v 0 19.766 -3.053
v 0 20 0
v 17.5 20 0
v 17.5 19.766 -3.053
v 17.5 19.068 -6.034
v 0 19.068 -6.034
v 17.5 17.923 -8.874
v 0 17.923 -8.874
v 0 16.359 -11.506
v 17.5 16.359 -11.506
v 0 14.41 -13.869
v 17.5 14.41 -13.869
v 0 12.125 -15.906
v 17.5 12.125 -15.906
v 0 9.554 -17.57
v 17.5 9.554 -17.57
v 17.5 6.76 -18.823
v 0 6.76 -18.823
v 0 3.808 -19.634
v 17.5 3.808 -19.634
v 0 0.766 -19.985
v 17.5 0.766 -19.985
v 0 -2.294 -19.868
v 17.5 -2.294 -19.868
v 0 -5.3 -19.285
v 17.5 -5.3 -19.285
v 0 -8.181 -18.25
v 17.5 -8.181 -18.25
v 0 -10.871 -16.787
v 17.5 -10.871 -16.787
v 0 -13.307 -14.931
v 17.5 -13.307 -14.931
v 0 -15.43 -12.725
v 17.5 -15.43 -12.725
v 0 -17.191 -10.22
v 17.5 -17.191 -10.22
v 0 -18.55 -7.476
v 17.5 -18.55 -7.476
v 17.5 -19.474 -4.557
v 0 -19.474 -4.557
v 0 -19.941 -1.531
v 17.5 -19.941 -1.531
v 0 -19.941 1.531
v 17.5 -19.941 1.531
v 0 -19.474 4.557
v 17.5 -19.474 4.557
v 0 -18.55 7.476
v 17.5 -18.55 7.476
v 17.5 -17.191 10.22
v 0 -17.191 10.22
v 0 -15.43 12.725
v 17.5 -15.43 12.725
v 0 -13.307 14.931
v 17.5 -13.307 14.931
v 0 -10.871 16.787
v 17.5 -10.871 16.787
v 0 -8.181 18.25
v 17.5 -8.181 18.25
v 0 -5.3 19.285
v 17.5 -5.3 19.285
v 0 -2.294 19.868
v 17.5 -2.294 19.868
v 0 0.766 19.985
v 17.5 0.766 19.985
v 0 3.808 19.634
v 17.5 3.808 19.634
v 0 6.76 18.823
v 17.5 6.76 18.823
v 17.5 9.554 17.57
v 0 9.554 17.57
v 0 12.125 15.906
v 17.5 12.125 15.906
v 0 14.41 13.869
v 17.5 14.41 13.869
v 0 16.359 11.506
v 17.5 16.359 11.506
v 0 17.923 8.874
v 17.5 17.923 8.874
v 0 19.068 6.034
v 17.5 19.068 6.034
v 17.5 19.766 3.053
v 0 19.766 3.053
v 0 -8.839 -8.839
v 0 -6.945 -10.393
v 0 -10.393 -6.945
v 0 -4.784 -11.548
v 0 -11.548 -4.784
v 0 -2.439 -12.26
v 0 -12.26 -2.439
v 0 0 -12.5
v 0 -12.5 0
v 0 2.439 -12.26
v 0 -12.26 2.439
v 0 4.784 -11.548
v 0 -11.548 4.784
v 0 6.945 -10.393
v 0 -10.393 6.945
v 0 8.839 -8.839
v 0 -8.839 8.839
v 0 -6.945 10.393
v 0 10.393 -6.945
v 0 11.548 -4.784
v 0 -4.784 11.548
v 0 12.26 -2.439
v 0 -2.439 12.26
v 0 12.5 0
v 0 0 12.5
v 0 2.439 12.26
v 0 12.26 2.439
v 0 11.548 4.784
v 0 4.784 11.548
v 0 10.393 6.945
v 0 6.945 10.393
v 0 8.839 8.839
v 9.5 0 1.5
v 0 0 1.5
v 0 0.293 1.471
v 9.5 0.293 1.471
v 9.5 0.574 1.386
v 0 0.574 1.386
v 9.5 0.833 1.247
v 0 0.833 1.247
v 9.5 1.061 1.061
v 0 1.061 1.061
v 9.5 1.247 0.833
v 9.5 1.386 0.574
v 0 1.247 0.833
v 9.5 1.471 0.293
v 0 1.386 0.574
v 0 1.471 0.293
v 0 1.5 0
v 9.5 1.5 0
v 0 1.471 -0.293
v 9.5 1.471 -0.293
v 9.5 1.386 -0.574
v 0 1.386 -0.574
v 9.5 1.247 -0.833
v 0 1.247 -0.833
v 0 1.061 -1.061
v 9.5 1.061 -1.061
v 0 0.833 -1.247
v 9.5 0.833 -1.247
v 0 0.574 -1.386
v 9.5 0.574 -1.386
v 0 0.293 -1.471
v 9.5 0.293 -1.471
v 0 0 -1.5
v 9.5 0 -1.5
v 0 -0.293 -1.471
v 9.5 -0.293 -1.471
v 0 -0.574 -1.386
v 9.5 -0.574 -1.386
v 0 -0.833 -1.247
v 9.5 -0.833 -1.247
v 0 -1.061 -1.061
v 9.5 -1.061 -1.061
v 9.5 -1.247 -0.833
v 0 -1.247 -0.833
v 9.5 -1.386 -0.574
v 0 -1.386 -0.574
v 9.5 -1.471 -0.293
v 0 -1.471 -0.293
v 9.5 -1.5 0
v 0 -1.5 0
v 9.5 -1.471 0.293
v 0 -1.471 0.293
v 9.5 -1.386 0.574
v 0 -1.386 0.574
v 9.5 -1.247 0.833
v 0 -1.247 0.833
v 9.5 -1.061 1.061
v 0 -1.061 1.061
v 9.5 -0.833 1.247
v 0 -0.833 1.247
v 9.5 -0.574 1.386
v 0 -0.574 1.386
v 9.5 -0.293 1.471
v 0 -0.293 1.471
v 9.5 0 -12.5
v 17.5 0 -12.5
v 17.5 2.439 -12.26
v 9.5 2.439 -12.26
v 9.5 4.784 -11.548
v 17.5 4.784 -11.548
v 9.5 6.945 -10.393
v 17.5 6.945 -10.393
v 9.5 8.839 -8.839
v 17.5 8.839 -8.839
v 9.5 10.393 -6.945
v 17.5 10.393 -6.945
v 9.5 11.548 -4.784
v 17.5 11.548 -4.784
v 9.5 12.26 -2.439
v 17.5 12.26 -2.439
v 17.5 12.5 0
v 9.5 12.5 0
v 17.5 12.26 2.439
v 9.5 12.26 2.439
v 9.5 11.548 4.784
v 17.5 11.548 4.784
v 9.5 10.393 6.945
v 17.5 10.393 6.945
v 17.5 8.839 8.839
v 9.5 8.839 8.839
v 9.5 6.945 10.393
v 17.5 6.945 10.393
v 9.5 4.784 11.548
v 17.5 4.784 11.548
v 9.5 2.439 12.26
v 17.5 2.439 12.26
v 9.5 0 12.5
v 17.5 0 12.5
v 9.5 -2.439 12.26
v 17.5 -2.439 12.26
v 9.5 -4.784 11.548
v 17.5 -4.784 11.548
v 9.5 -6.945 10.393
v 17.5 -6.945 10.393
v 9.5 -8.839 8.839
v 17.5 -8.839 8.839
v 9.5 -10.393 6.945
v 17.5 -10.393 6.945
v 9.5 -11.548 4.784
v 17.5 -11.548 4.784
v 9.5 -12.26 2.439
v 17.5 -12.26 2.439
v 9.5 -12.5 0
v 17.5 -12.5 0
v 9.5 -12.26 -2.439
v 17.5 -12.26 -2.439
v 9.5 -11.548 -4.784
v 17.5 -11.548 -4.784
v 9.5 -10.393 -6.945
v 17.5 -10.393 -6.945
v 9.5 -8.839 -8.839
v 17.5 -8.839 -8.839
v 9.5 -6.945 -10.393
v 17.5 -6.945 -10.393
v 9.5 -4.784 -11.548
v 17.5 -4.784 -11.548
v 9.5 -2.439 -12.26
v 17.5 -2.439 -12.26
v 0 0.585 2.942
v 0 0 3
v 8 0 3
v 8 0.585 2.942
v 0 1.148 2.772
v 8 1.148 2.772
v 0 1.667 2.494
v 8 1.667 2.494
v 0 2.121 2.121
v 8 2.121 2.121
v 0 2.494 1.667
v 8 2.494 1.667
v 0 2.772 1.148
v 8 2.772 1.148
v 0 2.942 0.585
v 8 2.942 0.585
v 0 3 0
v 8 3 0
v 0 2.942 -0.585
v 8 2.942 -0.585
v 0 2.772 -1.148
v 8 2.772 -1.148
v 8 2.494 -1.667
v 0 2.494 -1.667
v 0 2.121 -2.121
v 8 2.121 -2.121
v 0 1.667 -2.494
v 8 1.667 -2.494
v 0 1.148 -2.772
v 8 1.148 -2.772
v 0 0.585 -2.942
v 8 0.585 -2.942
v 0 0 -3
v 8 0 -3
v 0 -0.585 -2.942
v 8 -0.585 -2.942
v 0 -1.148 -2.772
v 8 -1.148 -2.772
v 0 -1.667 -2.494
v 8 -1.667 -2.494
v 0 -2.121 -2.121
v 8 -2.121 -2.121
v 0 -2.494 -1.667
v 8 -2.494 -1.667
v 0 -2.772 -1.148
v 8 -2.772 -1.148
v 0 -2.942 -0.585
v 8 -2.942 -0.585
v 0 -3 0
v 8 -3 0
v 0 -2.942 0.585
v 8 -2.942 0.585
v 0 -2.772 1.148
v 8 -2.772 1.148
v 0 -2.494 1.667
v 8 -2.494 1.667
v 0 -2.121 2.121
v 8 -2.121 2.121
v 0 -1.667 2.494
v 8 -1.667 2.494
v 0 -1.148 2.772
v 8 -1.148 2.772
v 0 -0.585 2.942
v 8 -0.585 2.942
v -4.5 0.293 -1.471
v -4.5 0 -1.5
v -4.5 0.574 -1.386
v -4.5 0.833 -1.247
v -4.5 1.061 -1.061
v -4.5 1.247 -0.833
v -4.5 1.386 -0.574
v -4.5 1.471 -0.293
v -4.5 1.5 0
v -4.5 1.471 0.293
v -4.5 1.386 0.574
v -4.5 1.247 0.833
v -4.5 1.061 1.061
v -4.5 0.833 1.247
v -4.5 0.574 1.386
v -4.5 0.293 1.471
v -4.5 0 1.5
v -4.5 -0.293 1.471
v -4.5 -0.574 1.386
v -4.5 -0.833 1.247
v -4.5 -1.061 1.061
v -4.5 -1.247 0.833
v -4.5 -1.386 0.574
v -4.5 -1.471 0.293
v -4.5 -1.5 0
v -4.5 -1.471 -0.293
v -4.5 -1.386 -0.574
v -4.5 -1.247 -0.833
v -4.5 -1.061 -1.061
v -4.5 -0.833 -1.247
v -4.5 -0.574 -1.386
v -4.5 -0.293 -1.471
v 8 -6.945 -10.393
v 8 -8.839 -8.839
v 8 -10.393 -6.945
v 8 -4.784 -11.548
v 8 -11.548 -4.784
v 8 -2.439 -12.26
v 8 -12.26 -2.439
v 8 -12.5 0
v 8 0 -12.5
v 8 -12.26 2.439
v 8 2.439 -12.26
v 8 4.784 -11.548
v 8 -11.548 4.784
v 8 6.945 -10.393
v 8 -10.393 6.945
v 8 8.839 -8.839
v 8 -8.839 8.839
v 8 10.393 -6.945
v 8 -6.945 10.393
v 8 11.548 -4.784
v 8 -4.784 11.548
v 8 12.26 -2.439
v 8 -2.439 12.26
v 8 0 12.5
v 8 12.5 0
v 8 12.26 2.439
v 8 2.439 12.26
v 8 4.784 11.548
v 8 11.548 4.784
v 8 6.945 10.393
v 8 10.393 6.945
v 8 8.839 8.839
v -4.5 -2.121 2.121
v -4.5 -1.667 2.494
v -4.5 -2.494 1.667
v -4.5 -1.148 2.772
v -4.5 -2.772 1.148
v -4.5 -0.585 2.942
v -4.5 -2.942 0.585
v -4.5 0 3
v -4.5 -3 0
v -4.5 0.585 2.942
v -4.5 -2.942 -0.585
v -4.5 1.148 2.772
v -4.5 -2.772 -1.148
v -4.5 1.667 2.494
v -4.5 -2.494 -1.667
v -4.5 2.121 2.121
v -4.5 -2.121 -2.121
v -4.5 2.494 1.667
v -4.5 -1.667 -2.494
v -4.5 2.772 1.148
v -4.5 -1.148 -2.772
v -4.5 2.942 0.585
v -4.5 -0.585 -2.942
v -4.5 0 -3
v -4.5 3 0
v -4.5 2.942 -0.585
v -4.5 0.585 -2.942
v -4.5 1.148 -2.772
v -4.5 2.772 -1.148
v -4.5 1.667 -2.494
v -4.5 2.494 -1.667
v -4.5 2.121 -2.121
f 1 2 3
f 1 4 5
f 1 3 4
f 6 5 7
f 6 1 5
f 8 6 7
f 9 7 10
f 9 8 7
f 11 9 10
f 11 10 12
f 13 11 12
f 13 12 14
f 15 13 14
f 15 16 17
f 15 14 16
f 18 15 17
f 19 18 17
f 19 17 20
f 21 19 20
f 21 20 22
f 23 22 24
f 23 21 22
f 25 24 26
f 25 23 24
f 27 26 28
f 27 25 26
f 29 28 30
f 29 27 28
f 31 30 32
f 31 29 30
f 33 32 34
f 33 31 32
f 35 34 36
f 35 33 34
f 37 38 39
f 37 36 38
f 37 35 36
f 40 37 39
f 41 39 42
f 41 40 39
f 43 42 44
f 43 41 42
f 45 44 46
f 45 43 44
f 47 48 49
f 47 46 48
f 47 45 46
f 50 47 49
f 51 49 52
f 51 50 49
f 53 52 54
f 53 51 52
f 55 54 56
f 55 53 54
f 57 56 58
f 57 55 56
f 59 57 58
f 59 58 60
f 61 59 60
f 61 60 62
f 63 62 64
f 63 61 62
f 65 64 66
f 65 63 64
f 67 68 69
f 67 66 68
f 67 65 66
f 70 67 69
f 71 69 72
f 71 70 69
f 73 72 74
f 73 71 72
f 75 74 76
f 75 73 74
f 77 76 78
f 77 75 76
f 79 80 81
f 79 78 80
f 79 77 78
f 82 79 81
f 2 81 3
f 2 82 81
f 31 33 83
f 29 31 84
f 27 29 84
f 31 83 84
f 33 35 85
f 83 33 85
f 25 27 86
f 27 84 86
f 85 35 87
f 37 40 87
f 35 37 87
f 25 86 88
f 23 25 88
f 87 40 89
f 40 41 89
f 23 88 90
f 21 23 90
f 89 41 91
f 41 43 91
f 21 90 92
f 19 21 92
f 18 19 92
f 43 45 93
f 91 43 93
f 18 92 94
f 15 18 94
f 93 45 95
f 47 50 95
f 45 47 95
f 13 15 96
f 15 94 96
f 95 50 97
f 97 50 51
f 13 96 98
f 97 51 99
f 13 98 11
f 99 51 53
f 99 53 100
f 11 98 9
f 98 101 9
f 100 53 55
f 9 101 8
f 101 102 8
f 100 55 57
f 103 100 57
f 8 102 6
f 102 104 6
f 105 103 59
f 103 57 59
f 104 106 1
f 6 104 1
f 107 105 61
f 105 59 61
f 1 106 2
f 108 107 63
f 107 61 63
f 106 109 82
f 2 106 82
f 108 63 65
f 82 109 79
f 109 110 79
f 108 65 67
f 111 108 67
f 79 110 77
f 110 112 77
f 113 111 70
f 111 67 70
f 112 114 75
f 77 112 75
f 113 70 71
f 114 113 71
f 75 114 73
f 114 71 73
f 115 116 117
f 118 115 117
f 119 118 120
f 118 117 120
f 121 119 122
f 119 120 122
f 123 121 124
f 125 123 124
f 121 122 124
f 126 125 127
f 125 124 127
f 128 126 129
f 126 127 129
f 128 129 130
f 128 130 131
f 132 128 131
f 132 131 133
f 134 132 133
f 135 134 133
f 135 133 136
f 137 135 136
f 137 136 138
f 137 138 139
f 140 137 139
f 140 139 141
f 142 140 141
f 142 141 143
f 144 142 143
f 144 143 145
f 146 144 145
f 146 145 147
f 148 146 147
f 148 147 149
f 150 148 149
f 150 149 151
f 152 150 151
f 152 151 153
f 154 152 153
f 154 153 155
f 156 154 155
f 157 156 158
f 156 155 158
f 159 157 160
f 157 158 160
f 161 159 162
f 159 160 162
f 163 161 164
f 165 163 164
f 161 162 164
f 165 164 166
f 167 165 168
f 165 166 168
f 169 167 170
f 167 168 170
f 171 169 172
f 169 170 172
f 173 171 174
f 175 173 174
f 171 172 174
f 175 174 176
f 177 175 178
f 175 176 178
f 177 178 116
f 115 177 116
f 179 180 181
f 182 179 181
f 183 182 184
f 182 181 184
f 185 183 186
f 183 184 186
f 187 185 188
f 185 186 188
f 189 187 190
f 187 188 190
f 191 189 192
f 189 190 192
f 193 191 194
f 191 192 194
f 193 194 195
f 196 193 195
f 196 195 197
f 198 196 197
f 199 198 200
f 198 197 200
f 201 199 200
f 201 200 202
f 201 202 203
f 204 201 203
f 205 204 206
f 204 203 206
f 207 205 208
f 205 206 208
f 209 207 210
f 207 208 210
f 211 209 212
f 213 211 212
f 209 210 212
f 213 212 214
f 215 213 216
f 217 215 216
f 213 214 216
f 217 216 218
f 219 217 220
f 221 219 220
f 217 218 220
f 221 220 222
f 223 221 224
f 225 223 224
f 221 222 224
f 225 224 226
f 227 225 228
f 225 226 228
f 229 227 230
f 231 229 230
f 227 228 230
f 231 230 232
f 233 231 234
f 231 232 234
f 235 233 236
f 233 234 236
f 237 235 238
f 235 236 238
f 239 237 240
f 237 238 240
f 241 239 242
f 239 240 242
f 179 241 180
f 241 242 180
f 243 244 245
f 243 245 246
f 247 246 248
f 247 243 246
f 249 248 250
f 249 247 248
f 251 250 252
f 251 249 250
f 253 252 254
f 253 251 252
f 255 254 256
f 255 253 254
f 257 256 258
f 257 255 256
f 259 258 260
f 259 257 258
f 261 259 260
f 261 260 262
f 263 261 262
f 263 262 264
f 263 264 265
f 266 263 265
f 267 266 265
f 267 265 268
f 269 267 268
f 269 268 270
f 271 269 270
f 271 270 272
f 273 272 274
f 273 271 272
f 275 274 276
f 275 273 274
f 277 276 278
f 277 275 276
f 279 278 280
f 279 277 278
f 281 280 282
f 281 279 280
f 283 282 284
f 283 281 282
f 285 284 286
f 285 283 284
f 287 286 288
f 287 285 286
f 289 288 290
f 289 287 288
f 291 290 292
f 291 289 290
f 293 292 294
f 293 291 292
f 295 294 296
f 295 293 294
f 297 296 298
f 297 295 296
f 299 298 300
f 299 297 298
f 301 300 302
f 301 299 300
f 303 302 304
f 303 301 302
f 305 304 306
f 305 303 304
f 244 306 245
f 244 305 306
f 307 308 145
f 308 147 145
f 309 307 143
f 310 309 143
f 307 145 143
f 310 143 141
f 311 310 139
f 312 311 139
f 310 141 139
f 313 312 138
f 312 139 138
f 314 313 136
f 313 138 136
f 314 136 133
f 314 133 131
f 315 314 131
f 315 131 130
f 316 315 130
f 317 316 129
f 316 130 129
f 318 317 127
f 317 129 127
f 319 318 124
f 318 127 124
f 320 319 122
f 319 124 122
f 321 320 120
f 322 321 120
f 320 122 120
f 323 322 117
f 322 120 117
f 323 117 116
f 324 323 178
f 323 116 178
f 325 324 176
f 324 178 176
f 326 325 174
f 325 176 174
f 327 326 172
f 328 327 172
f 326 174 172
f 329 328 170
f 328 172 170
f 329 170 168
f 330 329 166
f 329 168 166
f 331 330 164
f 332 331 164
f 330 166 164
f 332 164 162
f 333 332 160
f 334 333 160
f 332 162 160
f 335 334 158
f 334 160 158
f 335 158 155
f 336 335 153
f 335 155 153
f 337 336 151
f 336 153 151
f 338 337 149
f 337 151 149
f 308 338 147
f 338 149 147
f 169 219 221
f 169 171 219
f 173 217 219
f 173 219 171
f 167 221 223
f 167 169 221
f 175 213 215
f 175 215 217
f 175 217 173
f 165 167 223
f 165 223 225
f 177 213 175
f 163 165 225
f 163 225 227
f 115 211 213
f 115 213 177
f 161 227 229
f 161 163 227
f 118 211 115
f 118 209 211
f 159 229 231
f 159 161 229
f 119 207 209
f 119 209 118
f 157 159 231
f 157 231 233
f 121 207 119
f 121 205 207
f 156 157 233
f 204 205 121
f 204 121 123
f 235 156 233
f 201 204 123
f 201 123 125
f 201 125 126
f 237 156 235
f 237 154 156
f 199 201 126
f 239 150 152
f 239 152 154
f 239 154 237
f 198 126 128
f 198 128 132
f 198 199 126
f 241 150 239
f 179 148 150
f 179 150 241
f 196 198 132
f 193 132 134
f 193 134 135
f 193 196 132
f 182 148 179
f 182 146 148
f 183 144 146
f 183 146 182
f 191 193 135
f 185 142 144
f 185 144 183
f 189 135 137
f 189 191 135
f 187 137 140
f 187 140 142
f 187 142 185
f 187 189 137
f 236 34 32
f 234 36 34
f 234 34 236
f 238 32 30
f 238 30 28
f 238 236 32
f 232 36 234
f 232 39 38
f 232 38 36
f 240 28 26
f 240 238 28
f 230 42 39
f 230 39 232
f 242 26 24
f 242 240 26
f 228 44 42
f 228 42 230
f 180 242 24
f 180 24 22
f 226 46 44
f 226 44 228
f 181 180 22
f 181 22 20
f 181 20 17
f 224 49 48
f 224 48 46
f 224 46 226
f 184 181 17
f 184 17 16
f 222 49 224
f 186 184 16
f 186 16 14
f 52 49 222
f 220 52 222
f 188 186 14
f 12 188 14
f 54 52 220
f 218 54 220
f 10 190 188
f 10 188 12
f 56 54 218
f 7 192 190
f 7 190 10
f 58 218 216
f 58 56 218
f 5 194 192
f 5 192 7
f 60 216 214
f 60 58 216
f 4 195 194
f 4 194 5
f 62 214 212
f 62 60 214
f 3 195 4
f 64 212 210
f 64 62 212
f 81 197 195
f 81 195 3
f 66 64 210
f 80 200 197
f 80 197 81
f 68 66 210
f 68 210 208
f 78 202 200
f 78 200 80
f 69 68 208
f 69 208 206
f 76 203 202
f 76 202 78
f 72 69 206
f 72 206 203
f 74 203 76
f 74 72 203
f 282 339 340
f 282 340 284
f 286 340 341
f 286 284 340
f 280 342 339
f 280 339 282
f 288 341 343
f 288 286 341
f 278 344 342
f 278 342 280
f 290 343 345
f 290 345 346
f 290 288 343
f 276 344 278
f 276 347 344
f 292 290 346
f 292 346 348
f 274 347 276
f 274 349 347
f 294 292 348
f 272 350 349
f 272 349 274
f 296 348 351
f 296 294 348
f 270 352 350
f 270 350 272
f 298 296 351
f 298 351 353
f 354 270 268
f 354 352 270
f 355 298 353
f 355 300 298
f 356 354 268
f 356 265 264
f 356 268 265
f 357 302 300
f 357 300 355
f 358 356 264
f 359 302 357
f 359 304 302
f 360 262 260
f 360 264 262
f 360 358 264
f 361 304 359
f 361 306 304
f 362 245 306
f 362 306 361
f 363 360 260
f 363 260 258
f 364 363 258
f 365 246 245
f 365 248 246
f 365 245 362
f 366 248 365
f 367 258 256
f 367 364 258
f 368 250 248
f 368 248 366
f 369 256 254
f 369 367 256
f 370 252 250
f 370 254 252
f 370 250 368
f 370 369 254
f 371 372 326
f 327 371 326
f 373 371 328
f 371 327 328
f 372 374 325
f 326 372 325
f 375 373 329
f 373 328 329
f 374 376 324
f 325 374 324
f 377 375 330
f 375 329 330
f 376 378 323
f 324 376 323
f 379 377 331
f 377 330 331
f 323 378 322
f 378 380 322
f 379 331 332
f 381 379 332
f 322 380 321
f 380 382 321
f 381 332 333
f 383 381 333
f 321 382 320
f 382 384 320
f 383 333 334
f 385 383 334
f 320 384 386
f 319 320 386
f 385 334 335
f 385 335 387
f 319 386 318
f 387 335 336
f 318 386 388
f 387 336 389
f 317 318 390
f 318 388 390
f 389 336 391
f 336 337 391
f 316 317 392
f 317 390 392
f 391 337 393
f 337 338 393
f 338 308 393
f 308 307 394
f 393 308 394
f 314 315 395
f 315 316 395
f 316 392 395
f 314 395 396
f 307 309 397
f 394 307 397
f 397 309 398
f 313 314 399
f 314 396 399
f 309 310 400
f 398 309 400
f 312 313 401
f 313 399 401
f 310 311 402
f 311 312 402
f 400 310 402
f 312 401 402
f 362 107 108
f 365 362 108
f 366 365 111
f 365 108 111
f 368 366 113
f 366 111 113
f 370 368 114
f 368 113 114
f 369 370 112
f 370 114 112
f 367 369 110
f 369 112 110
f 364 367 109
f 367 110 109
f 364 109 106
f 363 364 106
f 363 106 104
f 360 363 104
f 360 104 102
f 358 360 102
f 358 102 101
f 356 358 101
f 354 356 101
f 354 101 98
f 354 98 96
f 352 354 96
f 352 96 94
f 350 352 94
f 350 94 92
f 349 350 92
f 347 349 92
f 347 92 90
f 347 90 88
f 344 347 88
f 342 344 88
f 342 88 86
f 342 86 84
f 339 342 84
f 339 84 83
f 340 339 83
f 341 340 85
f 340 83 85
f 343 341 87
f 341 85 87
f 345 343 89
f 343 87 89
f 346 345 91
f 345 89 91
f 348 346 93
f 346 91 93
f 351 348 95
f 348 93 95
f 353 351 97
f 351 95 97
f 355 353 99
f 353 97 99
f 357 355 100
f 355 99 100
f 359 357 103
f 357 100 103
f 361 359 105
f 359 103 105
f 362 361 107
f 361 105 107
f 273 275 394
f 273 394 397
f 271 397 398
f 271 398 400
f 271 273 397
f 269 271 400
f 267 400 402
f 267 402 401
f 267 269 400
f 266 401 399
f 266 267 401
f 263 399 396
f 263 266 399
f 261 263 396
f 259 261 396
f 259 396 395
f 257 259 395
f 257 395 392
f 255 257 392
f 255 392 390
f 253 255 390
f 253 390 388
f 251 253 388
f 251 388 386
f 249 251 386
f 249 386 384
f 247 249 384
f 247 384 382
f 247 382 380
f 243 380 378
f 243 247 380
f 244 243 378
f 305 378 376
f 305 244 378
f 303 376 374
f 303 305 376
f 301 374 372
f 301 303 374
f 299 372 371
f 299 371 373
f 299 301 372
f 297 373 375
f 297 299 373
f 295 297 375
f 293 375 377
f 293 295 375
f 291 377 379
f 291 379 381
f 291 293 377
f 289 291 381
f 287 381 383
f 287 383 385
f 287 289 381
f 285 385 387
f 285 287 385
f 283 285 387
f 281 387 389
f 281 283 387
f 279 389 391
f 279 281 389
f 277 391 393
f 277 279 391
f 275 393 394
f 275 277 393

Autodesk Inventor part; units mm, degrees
ref_plane "YZ Plane" through (0, 0, 0) normal (1, 0, 0) x (0, 1, 0)
ref_plane "XZ Plane" through (0, 0, 0) normal (0, 1, 0) x (-1, 0, 0)
ref_plane "XY Plane" through (0, 0, 0) normal (0, 0, 1) x (1, 0, 0)
sketch "Sketch1" plane through (0, 0, 0) normal (1, 0, 0) x (0, 1, 0)
  circle A0 centre (0, 0) radius 20
  dimension "d0" = 40
extrude "Extrusion1" add sketch "Sketch1" along normal blind 17.5
sketch "Sketch2" plane through (17.5, 0, 0) normal (1, 0, 0) x (0, 0, -1)
  circle A0 centre (0, 0) radius 3
  circle A1 centre (0, 0) radius 1.5
  dimension "d3" = 6
  dimension "d4" = 3
extrude "Extrusion2" add sketch "Sketch2" against normal blind 22
sketch "Sketch3" plane through (0, 0, 0) normal (-1, 0, 0) x (0, 0, 1)
  circle A0 centre (0, 0) radius 1.5 projected
  circle A1 centre (0, 0) radius 1.5
extrude "Extrusion3" cut sketch "Sketch3" against normal blind 50
sketch "Sketch4" plane through (17.5, 0, 0) normal (1, 0, 0) x (0, 0, -1)
  circle A0 centre (0, 0) radius 12.5
  dimension "d9" = 25
extrude "Extrusion4" cut sketch "Sketch4" against normal blind 8
sketch "Sketch5" plane through (0, 0, 0) normal (-1, 0, 0) x (0, 0, 1)
  circle A0 centre (0, 0) radius 12.5
  circle A1 centre (0, 0) radius 3
  dimension "d12" = 25
extrude "Extrusion5" cut sketch "Sketch5" against normal blind 8
properties part number "Back Wheel" material "PC/ABS Plastic"
